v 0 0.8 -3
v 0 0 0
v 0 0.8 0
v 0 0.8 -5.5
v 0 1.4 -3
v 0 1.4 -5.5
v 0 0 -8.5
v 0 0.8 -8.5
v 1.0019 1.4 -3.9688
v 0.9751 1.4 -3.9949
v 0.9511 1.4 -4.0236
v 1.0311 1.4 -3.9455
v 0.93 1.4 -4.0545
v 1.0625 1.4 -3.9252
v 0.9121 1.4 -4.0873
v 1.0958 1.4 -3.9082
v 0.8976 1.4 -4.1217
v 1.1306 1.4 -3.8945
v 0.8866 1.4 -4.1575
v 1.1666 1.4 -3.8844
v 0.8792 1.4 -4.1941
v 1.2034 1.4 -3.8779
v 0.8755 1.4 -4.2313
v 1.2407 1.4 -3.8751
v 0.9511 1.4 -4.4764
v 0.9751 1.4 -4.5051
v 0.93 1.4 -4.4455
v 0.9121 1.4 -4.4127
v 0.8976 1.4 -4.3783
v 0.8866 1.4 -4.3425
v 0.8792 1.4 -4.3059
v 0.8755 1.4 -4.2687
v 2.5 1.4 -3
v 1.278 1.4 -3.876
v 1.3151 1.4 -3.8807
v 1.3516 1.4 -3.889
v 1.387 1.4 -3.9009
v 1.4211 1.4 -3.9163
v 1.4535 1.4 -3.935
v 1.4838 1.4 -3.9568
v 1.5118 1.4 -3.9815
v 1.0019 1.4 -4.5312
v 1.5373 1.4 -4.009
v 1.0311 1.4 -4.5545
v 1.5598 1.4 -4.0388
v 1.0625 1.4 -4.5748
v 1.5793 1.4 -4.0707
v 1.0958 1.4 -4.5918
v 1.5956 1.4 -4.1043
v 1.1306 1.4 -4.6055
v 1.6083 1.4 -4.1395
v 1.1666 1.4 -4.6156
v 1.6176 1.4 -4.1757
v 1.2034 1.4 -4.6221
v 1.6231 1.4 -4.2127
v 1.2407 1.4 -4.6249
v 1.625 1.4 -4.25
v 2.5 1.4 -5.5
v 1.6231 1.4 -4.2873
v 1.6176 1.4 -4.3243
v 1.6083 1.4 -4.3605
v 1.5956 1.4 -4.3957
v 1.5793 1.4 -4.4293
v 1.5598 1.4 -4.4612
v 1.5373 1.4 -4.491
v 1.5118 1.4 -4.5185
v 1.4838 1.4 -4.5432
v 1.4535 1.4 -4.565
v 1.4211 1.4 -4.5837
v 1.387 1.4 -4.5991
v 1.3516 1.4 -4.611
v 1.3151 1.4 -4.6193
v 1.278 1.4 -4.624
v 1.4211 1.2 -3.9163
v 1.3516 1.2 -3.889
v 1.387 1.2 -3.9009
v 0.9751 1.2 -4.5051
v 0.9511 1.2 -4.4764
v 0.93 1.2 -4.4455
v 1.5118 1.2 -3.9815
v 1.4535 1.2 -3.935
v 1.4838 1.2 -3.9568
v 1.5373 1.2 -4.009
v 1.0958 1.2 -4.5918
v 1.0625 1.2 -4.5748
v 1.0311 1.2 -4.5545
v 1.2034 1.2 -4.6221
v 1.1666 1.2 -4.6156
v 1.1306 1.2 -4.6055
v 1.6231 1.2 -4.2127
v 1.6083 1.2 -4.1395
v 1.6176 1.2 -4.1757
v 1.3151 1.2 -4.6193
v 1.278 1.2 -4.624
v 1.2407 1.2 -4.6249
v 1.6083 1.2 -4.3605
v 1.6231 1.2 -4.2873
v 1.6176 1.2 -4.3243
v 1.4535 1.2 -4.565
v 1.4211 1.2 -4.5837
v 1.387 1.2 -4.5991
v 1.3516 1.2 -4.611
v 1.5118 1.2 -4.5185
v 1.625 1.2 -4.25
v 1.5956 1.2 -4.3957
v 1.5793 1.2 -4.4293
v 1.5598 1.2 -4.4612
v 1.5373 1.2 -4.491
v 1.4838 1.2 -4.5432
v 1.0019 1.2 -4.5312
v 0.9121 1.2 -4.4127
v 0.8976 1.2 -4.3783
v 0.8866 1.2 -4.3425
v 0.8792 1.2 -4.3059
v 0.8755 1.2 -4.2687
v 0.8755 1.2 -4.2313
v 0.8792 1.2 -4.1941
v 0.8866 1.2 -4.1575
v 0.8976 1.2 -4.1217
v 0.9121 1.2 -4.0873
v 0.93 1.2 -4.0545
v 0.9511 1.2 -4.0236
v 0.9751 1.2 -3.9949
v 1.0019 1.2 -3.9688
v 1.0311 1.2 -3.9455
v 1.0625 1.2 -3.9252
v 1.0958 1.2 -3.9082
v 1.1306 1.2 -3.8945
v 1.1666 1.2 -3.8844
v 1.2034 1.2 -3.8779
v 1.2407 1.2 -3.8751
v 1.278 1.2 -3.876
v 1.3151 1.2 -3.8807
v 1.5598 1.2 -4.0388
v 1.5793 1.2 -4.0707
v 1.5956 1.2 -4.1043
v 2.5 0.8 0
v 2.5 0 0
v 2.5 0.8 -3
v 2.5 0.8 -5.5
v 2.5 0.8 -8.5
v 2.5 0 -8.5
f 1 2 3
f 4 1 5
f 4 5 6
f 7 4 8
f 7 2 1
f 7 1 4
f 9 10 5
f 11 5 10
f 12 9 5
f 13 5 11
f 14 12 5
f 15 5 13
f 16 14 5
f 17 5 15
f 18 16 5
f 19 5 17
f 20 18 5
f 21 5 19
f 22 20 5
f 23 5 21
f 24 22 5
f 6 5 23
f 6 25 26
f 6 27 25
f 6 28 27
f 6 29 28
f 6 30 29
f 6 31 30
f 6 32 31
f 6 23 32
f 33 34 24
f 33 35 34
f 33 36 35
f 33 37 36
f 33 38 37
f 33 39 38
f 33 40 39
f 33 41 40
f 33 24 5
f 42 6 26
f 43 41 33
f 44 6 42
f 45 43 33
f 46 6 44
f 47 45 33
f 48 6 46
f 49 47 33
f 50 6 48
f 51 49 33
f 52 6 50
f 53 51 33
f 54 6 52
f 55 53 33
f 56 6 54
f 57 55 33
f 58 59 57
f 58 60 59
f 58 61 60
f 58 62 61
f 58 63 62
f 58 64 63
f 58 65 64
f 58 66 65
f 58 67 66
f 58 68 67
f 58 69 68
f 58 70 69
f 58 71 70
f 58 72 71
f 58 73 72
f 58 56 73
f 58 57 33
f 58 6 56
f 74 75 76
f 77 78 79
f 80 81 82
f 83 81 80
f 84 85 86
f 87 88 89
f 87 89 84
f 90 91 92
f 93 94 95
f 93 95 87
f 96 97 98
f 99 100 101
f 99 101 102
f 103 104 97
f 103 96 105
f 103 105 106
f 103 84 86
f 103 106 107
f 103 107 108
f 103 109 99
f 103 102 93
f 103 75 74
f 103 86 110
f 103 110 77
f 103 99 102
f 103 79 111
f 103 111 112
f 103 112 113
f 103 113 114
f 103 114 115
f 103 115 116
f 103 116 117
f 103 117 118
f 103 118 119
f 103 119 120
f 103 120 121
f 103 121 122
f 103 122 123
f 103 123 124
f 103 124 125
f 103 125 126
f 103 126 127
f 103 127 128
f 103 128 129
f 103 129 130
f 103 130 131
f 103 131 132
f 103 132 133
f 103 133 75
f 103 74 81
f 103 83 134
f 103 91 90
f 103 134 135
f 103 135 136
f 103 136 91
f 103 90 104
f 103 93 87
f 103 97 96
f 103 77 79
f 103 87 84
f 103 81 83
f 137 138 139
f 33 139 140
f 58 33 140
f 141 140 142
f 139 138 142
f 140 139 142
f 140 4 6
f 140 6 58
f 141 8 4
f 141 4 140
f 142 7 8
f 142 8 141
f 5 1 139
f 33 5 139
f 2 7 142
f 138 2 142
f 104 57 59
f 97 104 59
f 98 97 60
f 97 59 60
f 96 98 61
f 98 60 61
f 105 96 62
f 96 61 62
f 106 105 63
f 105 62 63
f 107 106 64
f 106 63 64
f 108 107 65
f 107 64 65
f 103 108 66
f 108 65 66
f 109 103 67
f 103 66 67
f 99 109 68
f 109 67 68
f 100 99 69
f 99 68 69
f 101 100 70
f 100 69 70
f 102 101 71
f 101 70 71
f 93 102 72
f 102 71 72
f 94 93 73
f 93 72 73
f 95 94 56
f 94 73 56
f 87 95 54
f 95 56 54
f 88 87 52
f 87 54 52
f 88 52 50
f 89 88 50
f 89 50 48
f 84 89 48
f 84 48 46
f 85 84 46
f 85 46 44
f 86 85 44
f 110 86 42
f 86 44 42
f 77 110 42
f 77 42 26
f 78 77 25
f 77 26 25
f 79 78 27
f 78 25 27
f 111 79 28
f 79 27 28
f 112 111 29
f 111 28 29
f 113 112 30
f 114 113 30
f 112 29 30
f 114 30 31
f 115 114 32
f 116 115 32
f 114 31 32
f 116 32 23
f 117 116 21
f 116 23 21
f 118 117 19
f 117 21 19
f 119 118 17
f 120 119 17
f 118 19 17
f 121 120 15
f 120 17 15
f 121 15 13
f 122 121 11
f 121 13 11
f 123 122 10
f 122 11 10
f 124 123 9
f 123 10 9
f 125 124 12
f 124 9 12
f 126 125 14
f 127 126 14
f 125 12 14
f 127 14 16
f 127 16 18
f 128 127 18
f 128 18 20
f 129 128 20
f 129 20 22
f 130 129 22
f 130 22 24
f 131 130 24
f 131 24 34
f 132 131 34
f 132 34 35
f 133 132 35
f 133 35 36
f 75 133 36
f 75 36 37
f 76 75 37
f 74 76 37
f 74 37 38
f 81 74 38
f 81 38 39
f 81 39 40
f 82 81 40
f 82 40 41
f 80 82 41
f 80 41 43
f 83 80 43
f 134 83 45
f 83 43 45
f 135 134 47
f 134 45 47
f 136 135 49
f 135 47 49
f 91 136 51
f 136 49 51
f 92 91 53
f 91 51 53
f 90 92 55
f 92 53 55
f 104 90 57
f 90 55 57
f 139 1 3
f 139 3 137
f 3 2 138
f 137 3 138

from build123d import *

# Parameters (mm, degrees)
SKETCH1_W           = 2.5
SKETCH1_H           = 8.5
BOSS_EXTRUDE1_DEPTH = 0.8
SKETCH2_W           = 2.5
SKETCH2_H           = 2.5
BOSS_EXTRUDE2_DEPTH = 0.6
SKETCH3_R           = 0.375
CUT_EXTRUDE1_DEPTH  = 0.2


with BuildPart() as part:
    # Sketch1 → Boss-Extrude1 (new body)
    with BuildSketch(Plane(origin=(0, 0, 0), x_dir=(1, 0, 0), z_dir=(0, 1, 0))):
        with Locations((1.25, 4.25)):
            Rectangle(SKETCH1_W, SKETCH1_H)
    extrude(amount=BOSS_EXTRUDE1_DEPTH)

    # Sketch2 → Boss-Extrude2 (add)
    with BuildSketch(Plane(origin=(0, 0.8, 0), x_dir=(1, 0, 0), z_dir=(0, 1, 0))):
        with Locations((1.25, 4.25)):
            Rectangle(SKETCH2_W, SKETCH2_H)
    extrude(amount=BOSS_EXTRUDE2_DEPTH)

    # Sketch3 → Cut-Extrude1 (cut)
    with BuildSketch(Plane(origin=(0, 1.4, 0), x_dir=(1, 0, 0), z_dir=(0, 1, 0))):
        with Locations((1.25, 4.25)):
            Circle(SKETCH3_R)
    extrude(amount=-CUT_EXTRUDE1_DEPTH, mode=Mode.SUBTRACT)


solid = part.part
